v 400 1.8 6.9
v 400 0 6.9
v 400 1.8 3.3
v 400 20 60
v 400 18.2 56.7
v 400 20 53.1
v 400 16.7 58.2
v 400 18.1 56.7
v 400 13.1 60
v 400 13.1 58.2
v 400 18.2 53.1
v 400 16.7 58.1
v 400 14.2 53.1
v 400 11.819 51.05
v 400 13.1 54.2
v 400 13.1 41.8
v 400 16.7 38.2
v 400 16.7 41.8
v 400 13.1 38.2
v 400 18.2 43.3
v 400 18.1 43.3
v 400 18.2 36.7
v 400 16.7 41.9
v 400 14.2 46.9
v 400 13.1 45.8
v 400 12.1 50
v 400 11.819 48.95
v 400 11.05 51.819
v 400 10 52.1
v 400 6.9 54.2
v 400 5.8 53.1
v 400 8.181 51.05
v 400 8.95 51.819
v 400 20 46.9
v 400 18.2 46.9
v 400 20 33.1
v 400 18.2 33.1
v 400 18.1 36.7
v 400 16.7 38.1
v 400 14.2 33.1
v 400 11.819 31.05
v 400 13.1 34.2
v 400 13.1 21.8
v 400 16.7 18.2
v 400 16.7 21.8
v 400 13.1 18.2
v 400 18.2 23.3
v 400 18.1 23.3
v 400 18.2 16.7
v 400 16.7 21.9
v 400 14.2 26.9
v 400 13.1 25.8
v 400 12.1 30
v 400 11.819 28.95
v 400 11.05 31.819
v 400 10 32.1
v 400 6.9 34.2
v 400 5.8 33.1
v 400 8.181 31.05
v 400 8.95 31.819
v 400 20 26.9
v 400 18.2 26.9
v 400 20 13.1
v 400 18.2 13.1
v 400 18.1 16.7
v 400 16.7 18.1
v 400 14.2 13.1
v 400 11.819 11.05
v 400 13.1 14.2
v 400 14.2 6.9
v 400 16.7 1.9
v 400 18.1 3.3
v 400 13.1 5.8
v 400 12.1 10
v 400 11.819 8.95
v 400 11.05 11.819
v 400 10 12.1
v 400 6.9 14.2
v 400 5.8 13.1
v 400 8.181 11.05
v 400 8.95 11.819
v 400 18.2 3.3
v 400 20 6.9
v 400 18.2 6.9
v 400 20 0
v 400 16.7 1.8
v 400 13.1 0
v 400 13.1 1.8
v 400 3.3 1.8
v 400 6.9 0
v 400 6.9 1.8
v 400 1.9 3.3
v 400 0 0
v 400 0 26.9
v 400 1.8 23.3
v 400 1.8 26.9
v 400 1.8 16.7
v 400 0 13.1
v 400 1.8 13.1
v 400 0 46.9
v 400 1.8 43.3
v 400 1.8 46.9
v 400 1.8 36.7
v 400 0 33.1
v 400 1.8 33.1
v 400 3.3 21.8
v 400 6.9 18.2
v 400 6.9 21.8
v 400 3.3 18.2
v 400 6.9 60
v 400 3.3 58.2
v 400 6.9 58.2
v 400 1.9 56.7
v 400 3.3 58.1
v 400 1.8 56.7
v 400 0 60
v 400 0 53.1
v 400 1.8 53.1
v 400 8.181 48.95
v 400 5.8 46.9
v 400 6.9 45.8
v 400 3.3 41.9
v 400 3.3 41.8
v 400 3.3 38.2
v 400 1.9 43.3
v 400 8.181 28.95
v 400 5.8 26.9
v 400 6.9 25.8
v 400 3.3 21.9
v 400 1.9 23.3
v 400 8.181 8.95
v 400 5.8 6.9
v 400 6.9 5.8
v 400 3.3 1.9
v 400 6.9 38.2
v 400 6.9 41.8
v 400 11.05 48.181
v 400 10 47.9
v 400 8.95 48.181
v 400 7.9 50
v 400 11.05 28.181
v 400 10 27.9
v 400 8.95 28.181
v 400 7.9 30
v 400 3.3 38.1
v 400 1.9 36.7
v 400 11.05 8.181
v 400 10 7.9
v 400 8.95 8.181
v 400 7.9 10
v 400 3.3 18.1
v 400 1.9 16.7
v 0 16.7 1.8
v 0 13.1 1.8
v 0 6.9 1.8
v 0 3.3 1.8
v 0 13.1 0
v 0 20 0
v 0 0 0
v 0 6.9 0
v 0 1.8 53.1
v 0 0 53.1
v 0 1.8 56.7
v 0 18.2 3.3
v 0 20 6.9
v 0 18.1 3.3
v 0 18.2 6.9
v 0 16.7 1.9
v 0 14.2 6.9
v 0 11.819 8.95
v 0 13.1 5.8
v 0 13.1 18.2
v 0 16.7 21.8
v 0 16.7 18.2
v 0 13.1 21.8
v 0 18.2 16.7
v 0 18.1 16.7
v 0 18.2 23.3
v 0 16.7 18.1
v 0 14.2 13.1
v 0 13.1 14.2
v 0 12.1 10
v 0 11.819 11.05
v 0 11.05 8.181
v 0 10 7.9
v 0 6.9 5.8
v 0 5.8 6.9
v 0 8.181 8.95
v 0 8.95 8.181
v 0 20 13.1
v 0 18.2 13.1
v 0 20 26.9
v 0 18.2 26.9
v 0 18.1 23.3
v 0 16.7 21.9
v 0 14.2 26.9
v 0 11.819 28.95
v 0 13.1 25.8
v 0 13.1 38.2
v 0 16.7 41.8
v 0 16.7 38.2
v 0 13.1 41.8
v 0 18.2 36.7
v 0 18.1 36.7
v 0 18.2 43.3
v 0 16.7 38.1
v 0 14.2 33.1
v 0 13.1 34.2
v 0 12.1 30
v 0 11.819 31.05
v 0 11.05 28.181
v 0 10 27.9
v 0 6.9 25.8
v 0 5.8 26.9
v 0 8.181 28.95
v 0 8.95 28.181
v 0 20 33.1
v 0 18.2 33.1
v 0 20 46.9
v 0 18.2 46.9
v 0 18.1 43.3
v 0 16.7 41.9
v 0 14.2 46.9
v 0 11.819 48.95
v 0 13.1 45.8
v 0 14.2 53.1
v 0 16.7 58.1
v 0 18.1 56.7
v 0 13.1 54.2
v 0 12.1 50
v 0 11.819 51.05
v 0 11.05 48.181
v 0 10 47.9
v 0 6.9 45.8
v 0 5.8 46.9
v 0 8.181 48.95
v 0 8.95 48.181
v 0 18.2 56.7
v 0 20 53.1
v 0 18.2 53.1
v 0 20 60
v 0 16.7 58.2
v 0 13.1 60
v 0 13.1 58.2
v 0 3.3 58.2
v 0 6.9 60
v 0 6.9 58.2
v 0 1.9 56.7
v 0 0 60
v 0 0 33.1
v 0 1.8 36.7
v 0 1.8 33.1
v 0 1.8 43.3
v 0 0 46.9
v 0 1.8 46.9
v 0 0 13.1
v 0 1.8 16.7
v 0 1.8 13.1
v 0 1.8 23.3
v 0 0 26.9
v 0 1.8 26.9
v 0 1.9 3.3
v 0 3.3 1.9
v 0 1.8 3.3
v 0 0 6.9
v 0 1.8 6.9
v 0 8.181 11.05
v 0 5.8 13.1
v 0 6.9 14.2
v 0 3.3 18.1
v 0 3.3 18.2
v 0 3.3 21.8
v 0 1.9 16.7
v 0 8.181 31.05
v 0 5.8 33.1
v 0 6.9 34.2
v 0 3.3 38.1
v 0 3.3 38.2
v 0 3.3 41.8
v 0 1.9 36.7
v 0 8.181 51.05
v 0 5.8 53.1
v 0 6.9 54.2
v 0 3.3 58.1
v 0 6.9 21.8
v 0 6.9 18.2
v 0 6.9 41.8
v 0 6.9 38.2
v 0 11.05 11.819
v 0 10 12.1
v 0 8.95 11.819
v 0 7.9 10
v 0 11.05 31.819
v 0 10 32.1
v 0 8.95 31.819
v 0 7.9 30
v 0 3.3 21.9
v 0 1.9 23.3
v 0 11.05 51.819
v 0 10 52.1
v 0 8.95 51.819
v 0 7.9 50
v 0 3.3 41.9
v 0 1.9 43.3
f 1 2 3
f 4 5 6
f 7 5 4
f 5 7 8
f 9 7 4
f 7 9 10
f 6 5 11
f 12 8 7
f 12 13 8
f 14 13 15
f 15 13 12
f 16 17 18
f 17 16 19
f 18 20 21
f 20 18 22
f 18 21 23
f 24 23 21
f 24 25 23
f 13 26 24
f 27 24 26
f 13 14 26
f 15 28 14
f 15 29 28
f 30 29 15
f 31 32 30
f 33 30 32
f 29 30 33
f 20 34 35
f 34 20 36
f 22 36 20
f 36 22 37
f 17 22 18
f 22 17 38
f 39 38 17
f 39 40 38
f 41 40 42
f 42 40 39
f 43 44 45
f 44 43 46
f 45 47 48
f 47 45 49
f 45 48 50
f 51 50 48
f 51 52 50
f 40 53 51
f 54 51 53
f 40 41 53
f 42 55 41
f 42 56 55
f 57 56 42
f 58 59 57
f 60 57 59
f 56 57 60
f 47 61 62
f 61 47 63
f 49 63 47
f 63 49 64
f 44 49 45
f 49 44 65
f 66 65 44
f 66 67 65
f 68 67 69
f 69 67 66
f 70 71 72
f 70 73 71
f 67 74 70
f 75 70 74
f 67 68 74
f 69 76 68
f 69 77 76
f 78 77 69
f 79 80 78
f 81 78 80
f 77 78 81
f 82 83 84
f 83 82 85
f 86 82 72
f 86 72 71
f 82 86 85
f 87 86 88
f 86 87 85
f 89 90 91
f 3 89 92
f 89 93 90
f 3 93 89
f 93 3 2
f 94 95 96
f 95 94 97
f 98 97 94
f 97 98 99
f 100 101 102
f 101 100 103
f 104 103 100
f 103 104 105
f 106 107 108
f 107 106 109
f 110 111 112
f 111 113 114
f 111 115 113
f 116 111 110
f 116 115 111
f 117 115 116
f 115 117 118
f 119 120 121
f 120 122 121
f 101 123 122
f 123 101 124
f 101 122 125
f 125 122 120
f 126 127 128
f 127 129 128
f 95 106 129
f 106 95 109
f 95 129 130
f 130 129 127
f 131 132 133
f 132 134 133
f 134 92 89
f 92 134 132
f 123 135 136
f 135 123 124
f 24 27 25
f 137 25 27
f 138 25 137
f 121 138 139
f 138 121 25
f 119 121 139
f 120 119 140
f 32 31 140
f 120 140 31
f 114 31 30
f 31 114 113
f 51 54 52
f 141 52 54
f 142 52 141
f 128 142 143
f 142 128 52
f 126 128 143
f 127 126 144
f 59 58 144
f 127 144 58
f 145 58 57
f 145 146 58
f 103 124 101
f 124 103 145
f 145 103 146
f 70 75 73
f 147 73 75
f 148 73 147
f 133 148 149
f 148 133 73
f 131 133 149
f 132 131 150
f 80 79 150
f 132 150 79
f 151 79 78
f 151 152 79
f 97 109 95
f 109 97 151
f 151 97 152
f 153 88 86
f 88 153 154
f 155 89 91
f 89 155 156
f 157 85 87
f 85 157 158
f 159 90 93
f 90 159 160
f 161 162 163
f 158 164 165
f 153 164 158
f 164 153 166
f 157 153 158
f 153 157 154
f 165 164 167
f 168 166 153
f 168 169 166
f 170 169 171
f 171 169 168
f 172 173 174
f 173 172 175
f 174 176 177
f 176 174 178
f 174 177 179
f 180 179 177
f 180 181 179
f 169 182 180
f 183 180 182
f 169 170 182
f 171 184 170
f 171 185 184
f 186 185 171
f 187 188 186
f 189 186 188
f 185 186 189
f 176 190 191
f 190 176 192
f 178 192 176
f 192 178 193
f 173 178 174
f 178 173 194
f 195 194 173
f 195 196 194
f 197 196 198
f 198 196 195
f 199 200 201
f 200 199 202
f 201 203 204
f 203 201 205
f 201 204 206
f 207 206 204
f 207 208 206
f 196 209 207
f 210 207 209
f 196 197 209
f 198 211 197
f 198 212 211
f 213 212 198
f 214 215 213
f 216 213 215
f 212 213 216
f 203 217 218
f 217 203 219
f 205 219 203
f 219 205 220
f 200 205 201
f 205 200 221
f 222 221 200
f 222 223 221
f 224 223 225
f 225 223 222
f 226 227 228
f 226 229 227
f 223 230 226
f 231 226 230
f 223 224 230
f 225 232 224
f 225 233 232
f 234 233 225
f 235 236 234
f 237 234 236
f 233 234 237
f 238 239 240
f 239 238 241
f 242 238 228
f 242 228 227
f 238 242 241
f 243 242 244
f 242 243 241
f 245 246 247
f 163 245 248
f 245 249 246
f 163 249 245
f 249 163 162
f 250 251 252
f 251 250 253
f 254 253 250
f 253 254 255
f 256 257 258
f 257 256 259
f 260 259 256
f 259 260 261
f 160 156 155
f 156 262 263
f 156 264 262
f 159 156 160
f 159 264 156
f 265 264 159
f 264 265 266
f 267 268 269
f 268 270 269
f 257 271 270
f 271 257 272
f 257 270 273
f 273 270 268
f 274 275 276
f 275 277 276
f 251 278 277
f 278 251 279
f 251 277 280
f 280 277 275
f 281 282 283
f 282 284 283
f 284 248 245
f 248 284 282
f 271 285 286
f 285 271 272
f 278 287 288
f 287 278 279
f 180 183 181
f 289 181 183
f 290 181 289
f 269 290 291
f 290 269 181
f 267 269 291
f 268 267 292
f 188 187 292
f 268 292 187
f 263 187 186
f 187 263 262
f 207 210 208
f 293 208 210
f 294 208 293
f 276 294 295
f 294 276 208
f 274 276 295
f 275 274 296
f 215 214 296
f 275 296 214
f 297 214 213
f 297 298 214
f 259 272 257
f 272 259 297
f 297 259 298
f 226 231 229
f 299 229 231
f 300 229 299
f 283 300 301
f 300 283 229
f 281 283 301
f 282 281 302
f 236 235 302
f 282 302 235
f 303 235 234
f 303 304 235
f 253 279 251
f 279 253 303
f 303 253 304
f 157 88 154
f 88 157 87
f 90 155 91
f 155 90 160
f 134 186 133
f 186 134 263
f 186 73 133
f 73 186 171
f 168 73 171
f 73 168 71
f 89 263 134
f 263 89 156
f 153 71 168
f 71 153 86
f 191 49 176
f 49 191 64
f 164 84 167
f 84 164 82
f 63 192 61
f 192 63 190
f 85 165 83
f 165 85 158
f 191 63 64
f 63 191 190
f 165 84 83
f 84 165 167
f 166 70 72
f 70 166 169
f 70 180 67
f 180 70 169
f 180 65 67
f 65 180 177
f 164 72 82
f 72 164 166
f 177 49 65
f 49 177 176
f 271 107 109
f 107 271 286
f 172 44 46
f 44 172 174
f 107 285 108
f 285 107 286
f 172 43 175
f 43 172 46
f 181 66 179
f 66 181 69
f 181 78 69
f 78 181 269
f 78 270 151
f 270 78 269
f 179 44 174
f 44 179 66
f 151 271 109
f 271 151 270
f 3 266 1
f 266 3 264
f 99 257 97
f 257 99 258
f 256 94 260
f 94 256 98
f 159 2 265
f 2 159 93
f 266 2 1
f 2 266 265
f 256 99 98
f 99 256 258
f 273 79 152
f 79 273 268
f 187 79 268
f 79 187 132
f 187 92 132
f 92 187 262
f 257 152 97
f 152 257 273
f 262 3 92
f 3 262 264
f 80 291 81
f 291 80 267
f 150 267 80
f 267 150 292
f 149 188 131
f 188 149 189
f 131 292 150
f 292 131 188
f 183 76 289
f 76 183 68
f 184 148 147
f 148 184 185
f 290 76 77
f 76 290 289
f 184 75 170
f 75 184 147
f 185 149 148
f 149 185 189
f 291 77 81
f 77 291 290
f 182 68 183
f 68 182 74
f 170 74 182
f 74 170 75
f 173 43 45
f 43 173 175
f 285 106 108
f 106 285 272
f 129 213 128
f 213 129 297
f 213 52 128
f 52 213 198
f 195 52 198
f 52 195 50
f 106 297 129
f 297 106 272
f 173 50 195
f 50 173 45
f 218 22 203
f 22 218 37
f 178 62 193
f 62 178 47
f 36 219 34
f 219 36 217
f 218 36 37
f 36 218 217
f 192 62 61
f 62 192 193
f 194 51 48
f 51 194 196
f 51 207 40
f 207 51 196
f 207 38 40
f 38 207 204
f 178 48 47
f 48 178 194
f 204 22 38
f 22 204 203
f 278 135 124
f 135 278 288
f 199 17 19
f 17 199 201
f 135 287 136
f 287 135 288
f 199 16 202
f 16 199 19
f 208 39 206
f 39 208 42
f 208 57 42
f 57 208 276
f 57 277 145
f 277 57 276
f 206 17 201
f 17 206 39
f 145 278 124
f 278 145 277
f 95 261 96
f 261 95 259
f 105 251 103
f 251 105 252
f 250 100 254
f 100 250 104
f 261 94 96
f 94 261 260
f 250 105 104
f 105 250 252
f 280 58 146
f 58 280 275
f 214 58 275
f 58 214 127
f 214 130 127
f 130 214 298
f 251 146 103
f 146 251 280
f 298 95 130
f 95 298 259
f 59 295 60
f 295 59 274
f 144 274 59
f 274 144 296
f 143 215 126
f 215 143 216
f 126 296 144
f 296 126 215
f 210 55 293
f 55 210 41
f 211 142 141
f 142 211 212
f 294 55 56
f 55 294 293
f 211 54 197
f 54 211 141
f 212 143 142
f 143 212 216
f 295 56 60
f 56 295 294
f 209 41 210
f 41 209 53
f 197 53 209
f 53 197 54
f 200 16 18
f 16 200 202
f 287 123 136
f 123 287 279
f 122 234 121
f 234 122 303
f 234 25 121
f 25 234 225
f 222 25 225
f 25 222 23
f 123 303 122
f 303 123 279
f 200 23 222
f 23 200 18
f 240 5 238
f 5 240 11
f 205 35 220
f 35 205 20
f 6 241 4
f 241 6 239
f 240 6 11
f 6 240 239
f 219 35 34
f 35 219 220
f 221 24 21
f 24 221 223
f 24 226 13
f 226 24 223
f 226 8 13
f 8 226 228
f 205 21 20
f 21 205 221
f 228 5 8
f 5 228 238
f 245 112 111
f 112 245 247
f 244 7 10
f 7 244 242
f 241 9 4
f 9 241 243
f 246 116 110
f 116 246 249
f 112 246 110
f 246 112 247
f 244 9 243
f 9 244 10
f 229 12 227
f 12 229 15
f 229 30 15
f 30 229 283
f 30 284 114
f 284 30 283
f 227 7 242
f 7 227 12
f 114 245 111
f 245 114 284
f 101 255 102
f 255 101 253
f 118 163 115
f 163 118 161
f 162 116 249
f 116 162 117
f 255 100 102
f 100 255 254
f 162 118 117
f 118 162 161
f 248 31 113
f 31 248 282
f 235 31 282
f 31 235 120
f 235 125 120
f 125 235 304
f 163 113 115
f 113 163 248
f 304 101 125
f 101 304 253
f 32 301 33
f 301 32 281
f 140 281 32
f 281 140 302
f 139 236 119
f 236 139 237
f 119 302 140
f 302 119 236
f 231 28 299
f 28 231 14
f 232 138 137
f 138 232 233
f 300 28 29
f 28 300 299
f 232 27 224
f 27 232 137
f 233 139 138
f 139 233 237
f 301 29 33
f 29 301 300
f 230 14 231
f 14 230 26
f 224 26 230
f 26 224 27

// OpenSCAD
module aluminium_profile(
    length,
    num_profiles = 1
){
    
    profile_width = 20;
    
    for ( i = [0: num_profiles - 1]){
        translate([0,0,profile_width* i])
        difference(){
            cube([length, profile_width, profile_width]);
            
            rotate([0,90,0])
            translate([-profile_width/2, profile_width/2,- length/ 2])
            cylinder(d= 4.2, h= 2 * length, $fn=12);
            
            translate([0,profile_width / 2, profile_width / 2])
            for(r = [0:4]){
                rotate([90 * r,0,0])
                translate([0,0,-profile_width / 2])
                union(){
                    translate([0,-3.1,0])
                    cube([length, 6.2, 1.8]);
                    hull(){
                        translate([0,-13.4/2,1.8])
                        cube([length, 13.4, .1]);
                        translate([0,-3.1,4.0])
                        cube([length, 6.2, 1.8]);
                    }
                }
            }
        }
    }
}


aluminium_profile(400,3);
